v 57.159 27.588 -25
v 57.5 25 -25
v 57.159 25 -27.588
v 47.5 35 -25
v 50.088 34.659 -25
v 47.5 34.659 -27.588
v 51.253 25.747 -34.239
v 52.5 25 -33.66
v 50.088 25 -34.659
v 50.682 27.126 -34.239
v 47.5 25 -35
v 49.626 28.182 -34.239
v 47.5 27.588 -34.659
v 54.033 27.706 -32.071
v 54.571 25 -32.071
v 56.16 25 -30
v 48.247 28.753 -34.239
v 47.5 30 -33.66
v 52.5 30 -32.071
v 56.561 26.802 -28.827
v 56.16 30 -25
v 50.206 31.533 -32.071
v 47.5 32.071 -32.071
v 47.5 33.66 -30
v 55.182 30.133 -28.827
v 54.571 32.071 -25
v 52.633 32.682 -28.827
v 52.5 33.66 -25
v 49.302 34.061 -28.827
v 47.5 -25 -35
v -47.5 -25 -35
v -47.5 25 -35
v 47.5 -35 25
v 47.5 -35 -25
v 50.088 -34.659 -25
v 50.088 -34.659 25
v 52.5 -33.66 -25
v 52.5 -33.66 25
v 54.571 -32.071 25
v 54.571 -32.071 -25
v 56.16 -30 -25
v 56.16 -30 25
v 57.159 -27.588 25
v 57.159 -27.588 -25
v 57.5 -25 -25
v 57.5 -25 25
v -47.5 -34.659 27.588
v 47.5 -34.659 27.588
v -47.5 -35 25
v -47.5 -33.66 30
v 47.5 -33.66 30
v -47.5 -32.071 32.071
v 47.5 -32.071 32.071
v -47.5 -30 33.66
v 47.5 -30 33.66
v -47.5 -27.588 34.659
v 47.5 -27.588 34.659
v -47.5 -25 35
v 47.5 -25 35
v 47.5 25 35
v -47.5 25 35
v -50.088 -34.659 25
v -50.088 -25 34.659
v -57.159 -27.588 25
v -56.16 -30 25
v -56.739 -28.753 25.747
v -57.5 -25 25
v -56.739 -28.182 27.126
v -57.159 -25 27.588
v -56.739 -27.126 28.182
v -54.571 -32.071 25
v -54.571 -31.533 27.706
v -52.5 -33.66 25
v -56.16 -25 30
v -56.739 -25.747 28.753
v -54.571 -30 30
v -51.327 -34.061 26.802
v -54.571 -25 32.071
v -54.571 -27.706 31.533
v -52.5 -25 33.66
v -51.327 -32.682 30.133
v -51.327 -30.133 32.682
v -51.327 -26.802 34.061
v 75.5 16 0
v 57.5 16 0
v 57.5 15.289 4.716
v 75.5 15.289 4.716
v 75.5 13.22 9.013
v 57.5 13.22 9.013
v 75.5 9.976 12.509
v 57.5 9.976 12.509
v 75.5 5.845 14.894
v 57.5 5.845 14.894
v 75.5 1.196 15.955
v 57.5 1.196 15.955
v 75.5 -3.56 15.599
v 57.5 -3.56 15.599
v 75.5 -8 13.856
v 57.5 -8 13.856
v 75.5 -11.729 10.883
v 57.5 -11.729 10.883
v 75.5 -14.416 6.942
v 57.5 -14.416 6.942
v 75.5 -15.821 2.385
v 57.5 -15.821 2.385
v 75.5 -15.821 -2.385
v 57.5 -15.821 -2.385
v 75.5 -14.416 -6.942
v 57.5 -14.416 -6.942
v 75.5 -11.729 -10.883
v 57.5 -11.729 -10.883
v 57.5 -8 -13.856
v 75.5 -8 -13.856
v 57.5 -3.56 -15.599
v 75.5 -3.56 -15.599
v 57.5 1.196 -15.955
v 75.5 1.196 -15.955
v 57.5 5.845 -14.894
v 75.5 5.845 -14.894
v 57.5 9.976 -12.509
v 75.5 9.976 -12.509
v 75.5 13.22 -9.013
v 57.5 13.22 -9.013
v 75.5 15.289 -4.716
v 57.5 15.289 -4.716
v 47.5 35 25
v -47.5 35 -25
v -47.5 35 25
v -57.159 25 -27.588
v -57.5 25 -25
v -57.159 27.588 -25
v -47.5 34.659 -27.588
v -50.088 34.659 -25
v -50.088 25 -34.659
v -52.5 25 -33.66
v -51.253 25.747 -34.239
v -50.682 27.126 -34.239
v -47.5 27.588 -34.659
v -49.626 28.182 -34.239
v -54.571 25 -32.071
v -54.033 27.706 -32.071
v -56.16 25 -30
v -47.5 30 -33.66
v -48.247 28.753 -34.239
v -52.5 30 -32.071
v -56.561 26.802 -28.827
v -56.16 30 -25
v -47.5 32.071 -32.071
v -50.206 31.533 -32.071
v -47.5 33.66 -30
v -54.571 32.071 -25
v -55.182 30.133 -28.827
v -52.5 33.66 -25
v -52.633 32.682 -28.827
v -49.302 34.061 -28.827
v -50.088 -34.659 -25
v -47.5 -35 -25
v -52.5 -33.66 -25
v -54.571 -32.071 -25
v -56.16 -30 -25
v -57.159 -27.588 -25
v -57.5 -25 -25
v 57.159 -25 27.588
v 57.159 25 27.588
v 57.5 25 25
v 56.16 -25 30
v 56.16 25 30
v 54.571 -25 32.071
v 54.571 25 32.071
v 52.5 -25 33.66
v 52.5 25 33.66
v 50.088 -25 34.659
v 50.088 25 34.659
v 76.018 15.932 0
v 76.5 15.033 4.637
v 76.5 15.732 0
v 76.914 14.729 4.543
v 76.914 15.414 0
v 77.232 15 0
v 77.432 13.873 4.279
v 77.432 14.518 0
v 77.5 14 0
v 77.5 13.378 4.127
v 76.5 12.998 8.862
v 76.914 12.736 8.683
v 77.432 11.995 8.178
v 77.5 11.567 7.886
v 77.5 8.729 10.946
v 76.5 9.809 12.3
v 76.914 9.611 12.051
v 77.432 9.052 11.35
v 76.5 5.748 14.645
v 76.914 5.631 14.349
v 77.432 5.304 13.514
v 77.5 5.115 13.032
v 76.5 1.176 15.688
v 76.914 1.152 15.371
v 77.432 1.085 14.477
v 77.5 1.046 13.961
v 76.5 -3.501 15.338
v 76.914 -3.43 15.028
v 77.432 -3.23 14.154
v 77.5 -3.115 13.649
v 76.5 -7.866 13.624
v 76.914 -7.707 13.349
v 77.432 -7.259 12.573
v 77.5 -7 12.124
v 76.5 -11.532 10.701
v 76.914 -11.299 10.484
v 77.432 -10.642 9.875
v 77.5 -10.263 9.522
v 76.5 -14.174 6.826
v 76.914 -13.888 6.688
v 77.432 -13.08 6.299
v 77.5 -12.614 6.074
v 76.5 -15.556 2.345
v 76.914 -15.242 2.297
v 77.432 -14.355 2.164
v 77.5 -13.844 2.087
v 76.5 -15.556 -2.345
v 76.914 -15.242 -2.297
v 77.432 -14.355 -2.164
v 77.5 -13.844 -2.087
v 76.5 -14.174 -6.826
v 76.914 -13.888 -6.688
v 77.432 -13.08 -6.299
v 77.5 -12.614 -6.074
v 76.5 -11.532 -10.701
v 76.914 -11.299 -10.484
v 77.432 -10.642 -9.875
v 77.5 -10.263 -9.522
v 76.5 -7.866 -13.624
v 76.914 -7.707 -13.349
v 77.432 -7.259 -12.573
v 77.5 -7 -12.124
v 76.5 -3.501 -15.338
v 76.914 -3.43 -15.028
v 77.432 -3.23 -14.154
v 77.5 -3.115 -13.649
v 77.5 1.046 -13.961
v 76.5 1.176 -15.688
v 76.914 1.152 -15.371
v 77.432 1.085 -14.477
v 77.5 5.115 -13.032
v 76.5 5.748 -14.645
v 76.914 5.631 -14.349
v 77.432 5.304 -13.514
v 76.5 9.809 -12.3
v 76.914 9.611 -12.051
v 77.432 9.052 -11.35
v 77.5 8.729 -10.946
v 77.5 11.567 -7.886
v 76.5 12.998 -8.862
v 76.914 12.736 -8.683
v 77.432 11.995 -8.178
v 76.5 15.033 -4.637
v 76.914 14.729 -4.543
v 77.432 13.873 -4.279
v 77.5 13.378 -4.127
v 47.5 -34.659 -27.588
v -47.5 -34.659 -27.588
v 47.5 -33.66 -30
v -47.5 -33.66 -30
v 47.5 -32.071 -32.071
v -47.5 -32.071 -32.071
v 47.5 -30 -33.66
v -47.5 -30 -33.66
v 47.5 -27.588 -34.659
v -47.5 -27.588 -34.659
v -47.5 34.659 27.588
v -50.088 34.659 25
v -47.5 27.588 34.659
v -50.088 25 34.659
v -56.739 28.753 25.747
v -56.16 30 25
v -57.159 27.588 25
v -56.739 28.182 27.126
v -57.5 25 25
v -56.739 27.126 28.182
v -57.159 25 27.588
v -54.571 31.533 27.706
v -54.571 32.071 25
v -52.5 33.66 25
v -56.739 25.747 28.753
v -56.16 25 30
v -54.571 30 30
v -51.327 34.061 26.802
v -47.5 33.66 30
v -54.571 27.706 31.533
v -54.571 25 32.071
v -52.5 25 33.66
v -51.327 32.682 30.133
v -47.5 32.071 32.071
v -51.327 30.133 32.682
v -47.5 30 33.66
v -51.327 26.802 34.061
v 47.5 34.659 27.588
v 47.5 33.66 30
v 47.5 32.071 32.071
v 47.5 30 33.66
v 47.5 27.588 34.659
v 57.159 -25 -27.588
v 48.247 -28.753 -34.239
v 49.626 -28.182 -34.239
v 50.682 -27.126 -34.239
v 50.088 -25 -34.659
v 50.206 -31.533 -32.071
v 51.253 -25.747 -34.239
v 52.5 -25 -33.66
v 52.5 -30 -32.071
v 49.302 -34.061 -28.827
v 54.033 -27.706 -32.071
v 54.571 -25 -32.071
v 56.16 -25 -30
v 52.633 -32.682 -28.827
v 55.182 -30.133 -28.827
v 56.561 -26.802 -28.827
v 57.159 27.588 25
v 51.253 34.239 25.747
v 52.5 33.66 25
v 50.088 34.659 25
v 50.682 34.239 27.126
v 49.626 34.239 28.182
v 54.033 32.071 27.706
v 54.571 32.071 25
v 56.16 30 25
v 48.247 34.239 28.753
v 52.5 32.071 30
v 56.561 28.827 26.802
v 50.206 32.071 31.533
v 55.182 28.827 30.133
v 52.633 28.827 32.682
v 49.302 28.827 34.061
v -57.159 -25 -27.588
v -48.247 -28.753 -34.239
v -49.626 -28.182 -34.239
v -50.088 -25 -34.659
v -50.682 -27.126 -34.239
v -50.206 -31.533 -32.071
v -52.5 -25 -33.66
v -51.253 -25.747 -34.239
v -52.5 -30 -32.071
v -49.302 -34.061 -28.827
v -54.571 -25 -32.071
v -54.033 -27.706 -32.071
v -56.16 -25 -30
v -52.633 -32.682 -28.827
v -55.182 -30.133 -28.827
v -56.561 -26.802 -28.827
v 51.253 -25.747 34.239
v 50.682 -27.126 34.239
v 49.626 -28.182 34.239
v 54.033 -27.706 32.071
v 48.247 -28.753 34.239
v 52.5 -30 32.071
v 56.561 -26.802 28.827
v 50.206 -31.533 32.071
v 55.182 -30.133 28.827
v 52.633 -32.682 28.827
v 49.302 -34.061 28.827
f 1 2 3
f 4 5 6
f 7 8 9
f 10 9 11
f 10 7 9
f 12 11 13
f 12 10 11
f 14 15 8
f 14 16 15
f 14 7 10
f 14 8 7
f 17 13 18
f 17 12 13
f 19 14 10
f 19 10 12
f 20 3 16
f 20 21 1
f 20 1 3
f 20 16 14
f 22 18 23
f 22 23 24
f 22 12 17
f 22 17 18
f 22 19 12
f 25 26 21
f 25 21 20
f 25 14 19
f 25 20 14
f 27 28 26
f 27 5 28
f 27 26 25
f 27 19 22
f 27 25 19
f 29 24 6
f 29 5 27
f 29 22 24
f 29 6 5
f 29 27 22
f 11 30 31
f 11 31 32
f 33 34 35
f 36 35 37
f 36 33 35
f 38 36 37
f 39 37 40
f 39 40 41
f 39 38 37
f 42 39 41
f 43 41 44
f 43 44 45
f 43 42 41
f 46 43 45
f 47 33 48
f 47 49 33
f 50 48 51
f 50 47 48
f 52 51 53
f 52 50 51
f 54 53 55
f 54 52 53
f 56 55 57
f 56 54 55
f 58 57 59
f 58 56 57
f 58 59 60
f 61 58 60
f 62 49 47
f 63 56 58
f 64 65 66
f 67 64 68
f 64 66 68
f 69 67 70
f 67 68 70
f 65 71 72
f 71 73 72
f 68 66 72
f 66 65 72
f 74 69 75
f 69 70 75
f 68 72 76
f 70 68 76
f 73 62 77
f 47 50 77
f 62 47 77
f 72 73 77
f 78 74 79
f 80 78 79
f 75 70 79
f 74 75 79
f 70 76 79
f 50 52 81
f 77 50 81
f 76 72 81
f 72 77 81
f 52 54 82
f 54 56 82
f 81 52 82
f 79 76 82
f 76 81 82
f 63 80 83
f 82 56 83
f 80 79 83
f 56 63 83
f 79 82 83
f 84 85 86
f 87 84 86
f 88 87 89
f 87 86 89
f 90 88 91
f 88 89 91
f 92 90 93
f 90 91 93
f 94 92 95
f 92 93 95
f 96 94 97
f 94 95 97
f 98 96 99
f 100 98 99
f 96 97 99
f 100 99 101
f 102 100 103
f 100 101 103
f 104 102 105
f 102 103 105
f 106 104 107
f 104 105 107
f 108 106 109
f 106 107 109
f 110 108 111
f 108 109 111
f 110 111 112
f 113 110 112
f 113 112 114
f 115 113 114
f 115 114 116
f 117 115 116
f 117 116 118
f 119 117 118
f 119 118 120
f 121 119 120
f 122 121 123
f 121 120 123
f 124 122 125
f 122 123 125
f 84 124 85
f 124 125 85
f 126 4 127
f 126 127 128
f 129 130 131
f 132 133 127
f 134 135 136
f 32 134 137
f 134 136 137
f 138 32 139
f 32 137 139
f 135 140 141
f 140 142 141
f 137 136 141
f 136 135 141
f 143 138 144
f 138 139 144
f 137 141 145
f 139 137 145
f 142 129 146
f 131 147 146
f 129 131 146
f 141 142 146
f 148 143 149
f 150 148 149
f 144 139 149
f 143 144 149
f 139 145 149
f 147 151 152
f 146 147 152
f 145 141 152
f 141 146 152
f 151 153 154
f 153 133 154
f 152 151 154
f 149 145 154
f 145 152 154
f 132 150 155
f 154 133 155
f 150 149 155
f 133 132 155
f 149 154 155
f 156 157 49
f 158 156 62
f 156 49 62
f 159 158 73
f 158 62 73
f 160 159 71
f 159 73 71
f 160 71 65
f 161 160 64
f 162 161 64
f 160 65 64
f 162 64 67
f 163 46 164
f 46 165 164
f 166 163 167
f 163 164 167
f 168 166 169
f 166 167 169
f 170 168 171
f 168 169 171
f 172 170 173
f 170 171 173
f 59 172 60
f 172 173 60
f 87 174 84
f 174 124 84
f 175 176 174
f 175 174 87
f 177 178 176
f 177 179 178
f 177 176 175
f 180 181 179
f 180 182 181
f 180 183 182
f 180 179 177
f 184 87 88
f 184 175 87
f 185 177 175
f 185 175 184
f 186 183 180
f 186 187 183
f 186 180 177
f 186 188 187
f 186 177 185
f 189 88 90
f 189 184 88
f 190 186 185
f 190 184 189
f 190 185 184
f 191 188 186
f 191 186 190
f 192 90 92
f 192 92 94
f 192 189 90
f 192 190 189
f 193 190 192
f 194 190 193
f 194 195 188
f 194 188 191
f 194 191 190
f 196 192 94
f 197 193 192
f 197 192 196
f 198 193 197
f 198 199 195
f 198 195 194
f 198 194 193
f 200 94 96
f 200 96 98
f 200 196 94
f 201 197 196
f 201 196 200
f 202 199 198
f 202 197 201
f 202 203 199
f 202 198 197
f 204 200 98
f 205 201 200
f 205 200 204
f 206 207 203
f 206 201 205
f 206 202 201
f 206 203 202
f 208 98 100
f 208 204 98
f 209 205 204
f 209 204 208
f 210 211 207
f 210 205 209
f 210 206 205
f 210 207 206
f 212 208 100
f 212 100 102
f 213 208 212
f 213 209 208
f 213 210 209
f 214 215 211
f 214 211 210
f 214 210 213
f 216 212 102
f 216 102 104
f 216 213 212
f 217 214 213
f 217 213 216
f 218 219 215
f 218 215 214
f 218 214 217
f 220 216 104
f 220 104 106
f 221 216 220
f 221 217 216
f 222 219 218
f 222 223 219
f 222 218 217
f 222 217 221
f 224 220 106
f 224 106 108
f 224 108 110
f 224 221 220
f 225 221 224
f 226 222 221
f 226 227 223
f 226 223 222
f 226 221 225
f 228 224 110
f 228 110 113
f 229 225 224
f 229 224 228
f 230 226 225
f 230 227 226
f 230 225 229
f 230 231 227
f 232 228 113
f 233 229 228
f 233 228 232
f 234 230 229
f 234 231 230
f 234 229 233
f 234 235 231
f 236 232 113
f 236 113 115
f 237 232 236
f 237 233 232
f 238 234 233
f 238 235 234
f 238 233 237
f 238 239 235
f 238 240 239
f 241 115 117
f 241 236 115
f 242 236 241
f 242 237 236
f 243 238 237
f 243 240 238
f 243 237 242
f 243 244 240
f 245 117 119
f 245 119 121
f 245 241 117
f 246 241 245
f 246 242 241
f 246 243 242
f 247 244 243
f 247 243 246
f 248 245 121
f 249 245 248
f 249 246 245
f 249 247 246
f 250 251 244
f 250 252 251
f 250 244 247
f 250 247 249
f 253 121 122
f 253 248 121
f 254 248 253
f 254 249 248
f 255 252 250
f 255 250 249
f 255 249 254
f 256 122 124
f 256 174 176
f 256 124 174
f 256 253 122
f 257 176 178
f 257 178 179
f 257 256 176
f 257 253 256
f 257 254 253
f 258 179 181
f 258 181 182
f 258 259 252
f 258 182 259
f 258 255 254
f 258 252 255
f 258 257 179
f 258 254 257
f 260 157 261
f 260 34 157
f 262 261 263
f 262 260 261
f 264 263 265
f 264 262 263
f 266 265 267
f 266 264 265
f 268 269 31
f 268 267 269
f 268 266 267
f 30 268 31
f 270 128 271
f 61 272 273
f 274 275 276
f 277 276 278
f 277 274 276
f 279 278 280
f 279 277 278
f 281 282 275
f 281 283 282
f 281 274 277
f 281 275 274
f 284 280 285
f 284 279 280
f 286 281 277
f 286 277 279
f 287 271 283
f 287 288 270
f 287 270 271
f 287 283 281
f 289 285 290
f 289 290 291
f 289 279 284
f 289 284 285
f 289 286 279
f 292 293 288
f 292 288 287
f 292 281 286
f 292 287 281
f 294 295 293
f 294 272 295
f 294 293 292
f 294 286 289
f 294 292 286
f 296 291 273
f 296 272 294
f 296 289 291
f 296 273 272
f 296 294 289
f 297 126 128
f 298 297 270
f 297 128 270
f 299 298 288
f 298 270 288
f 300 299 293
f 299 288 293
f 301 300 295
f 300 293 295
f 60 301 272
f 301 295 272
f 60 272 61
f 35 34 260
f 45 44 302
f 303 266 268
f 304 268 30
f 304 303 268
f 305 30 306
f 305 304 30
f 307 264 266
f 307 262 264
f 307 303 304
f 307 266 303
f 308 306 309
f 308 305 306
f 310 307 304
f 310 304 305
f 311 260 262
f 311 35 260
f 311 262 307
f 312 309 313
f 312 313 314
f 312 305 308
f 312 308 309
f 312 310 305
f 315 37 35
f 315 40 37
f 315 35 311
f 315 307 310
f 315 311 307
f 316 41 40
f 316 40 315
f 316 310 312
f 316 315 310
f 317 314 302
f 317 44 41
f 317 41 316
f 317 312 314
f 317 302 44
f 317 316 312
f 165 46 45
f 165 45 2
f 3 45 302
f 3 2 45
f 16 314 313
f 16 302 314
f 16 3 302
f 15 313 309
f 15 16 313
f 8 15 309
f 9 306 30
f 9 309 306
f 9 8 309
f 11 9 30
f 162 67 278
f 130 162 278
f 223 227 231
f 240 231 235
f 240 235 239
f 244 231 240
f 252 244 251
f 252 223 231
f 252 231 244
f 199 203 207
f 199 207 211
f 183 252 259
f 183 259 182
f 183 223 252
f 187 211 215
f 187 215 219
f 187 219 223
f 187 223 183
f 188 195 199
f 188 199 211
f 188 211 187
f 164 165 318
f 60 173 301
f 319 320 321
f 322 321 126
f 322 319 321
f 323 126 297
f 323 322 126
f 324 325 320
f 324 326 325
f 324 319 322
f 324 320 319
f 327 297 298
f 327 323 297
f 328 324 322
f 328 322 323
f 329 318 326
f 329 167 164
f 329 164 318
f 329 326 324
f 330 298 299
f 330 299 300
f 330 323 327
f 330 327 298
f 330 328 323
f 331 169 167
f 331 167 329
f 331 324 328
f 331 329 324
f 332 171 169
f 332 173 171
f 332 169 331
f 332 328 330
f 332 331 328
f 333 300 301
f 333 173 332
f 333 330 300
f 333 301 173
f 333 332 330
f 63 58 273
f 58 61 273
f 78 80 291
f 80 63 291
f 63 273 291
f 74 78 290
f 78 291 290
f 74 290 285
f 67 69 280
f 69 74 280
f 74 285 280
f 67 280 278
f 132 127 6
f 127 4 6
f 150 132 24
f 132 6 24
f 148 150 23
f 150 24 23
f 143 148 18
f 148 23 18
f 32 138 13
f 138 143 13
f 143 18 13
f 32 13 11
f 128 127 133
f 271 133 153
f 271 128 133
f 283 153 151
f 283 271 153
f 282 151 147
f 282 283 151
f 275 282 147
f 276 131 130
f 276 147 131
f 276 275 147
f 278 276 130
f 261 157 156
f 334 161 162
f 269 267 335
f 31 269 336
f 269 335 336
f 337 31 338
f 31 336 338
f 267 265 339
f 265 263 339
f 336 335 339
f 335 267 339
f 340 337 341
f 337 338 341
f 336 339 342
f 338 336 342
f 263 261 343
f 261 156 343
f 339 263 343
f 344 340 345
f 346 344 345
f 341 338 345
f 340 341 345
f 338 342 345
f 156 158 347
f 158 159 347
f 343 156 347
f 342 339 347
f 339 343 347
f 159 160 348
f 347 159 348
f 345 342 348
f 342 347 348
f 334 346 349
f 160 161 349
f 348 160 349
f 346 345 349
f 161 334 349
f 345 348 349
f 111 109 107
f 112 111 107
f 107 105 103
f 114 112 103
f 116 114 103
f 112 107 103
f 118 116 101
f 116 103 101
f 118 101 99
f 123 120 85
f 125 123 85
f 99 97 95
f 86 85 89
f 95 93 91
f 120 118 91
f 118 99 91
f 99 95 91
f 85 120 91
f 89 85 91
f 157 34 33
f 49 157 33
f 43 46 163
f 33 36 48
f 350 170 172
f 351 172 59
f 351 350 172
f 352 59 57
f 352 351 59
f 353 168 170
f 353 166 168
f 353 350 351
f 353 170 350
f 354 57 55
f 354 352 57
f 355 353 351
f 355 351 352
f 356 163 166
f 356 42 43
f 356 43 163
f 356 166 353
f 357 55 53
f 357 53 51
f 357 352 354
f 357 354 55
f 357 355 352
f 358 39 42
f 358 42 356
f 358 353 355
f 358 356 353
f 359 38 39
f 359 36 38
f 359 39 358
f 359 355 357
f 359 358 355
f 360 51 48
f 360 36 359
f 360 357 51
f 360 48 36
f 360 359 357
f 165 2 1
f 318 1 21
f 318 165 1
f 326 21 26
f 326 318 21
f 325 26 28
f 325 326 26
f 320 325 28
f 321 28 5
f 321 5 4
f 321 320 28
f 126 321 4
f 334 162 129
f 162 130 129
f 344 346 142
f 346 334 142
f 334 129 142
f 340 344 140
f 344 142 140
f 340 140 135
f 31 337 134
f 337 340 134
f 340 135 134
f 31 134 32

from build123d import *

# Parameters (mm, degrees)
F0_W     = 70
F0_H     = 70
F1_DEPTH = 57.5
F2_R     = 10
F3_R     = 16
F4_DEPTH = 20
F6_R     = 2


with BuildPart() as f1:
    # F0 (on Right) → F1 (new body, symmetric)
    with BuildSketch(Plane.YZ):
        Rectangle(F0_W, F0_H)
    extrude(amount=F1_DEPTH, both=True)

    # F2
    f2_edges = [f1.edges().sort_by_distance(p)[0] for p in [
        (57.5, -35, 0),
        (57.5, 0, 35),
        (0, -35, 35),
        (57.5, 35, 0),
        (0, 35, 35),
        (-57.5, 35, 0),
        (-57.5, -35, 0),
        (0, -35, -35),
        (57.5, 0, -35),
        (-57.5, 0, -35),
        (-57.5, 0, 35),
        (0, 35, -35),
    ]]
    fillet(f2_edges, radius=F2_R)


with BuildPart() as f4:
    # F3 (on Right) → F4 (new body)
    with BuildSketch(Plane.YZ):
        Circle(F3_R)
    extrude(amount=F4_DEPTH)


with BuildPart() as f4_1:
    # F5: moved
    add(f4.part.moved(Location((57.5, 0, 0))))

    # F6
    f6_edges = [f4_1.edges().sort_by_distance(p)[0] for p in [
        (77.5, -16, 0),
    ]]
    fillet(f6_edges, radius=F6_R)


solid = Compound([f1.part, f4_1.part])
